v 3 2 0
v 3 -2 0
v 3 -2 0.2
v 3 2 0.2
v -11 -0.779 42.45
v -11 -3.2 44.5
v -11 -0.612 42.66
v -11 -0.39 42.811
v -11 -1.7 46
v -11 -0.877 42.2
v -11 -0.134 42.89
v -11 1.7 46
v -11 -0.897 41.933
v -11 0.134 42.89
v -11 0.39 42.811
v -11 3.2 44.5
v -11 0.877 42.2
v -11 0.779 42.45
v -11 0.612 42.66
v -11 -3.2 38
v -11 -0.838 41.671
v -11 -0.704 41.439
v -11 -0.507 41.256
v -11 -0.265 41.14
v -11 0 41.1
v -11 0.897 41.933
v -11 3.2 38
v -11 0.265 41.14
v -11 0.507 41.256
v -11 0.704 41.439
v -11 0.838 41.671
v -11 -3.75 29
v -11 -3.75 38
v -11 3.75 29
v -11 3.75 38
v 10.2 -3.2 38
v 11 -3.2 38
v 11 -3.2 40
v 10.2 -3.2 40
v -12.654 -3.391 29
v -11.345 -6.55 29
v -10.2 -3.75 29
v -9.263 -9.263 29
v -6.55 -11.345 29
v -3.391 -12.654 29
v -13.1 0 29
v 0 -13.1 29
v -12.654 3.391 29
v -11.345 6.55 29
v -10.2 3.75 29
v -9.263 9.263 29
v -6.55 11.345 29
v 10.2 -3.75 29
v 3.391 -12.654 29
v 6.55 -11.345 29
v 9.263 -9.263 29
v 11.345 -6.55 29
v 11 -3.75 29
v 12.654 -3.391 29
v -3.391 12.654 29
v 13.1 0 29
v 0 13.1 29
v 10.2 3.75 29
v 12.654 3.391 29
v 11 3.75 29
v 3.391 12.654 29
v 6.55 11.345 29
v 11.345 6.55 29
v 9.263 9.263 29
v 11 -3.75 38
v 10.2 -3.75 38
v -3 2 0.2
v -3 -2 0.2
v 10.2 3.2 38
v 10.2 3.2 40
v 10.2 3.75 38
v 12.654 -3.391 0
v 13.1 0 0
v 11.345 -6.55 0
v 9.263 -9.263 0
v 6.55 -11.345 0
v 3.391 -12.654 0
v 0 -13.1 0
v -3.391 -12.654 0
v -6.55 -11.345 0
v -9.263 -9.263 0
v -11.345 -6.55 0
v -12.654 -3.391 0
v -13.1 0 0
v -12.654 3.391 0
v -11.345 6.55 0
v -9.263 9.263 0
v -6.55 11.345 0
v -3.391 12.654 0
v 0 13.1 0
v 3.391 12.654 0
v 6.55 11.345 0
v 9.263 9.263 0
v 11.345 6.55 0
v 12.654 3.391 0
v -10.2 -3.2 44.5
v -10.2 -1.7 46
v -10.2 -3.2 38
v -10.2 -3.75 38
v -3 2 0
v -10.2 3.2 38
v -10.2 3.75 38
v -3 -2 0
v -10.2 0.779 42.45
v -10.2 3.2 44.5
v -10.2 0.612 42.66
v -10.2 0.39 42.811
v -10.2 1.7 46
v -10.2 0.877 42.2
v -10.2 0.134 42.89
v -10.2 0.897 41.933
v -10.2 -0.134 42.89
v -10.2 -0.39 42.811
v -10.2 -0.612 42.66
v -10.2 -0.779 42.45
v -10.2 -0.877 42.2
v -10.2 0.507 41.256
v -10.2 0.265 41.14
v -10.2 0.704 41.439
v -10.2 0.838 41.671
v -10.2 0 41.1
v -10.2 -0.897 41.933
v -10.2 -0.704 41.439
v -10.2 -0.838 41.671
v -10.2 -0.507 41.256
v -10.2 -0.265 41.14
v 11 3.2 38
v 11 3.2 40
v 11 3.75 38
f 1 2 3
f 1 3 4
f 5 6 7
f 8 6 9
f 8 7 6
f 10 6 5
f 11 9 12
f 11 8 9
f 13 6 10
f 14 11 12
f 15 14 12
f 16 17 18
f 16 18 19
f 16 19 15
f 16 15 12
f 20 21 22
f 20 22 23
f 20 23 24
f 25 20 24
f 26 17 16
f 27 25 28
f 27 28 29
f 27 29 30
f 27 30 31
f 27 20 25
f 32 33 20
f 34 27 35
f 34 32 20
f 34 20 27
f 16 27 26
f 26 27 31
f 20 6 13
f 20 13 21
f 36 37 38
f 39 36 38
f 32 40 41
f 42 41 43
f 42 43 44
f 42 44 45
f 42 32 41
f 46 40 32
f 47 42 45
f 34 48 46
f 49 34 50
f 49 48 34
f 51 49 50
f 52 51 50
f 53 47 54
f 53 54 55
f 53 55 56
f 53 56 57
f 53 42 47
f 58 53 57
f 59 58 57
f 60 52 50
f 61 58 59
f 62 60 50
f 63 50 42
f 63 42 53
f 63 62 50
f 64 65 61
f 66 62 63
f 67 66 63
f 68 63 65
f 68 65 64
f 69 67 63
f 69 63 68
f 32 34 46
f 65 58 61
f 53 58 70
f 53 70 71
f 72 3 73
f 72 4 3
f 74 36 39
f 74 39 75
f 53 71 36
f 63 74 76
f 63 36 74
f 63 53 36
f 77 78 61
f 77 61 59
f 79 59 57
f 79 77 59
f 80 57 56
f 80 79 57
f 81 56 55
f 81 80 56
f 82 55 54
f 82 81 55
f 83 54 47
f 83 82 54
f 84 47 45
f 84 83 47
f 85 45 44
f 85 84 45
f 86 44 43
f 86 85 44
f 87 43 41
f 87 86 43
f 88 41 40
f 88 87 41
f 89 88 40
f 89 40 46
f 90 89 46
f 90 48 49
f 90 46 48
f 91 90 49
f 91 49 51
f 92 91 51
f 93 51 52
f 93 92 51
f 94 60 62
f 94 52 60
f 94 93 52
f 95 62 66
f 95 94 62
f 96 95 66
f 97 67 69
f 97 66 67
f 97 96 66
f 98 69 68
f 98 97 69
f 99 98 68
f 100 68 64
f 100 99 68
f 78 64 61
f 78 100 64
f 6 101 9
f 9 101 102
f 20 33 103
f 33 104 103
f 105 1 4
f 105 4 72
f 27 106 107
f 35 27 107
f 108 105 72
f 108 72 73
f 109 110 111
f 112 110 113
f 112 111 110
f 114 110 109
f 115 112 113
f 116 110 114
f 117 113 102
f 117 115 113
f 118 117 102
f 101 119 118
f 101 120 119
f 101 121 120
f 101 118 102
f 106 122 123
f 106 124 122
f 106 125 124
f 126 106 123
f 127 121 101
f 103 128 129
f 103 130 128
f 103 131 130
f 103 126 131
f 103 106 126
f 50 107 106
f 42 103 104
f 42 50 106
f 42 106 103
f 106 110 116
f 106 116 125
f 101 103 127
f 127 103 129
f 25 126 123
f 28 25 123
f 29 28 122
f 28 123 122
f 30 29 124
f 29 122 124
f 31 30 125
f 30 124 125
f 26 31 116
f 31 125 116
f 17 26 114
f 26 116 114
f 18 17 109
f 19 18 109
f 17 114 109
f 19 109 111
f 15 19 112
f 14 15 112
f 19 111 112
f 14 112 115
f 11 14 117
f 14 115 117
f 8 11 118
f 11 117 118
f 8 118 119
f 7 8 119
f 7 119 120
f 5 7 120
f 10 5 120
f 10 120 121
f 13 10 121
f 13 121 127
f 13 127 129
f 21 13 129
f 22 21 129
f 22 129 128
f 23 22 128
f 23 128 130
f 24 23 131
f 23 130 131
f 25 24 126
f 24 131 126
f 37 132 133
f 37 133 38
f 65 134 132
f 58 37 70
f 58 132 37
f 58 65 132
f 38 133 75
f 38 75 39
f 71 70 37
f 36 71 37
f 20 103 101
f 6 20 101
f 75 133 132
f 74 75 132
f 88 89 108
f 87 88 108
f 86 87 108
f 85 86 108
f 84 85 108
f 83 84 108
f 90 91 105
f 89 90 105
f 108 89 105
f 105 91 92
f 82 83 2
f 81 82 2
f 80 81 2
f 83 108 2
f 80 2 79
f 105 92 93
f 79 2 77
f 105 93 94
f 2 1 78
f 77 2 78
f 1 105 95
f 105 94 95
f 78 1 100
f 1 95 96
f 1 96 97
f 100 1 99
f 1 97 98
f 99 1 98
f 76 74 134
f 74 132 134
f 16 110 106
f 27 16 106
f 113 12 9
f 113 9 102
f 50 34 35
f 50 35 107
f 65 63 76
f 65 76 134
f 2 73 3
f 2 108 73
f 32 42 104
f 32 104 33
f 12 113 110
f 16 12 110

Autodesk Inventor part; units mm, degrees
ref_plane "YZ Plane" through (0, 0, 0) normal (1, 0, 0) x (0, 1, 0)
ref_plane "XZ Plane" through (0, 0, 0) normal (0, 1, 0) x (-1, 0, 0)
ref_plane "XY Plane" through (0, 0, 0) normal (0, 0, 1) x (1, 0, 0)
sketch "Skizze1" plane through (0, 0, 0) normal (0, 0, 1) x (1, 0, 0)
  circle A0 centre (0, 0) radius 13.1
  dimension "d0" = 26.2
extrude "Extrusion1" add sketch "Skizze1" along normal blind 29
sketch "Skizze2" plane through (0, 0, 29) normal (0, 0, 1) x (1, 0, 0)
  line L0 (-11, 3.75) -> (-10.2, 3.75)
  line L1 (-10.2, 3.75) -> (-10.2, -3.75)
  line L2 (-10.2, -3.75) -> (-11, -3.75)
  line L3 (-11, -3.75) -> (-11, 3.75)
  line L4 (10.2, 3.75) -> (11, 3.75)
  line L5 (11, 3.75) -> (11, -3.75)
  line L6 (11, -3.75) -> (10.2, -3.75)
  line L7 (10.2, -3.75) -> (10.2, 3.75)
  line L8 (10.2, 0) -> (-10.2, 0) construction
  point P0 (0, 0)
  point P1 (0, 0)
  dimension "d3" = 7.5
  dimension "d4" = 0.8
  dimension "d6" = 22
sketch "Skizze3" plane through (0, 0, 0) normal (0, 1, 0) x (-1, 0, 0)
  line L0 (13.1, 29) -> (-13.1, 29) projected
  line L1 (-13.1, 0) -> (13.1, 0) projected
  line L2 (-13.1, 0) -> (-13.1, 29) projected
  line L3 (13.1, 0) -> (13.1, 29) projected
  point P0 (0, 0)
  dimension "d7" = 29
extrude "Extrusion2" add sketch "Skizze2" along normal blind 17
sketch "Skizze4" plane through (11, -3.75, 29) normal (1, 0, 0) x (0, 0, -1)
  line L0 (0, 7.5) -> (0, 0) projected
  line L1 (0, 7.5) -> (-17, 7.5) construction
  line L2 (-17, 0) -> (-17, 7.5) construction
  line L3 (0, 0) -> (-17, 0) construction
  line L4 (0, 0) -> (-17, 0) construction
  line L5 (-9, 0) -> (-9, 0.55)
  line L6 (-9, 0.55) -> (-15.5, 0.55)
  line L7 (-15.5, 0.55) -> (-17, 2.05)
  line L8 (-17, 5.45) -> (-15.5, 6.95)
  line L9 (-15.5, 6.95) -> (-9, 6.95)
  line L10 (-9, 6.95) -> (-9, 7.5)
  line L11 (0, 7.5) -> (-17, 7.5) construction
  circle A0 centre (-13, 3.75) radius 0.9
  line L12 (-13, 3.75) -> (-17, 3.75) construction
  line L13 (-17, 0) -> (-17, 7.5) construction
  line L14 (-17, 0) -> (-17, 7.5) construction
  line L15 (-9, 0) -> (-17, 0)
  line L16 (-17, 2.05) -> (-17, 0)
  line L17 (-17, 5.45) -> (-17, 7.5)
  line L18 (-9, 7.5) -> (-17, 7.5)
  point P0 (29, 3.75)
  dimension "d10" = 45
  dimension "d11" = 45
  dimension "d12" = 6.4
  dimension "d13" = 8
  dimension "d14" = 1.5
  dimension "d15" = 1.8
  dimension "d16" = 4
extrude "Extrusion3" cut sketch "Skizze4" against normal through all
sketch "Skizze5" plane through (0, 0, 0) normal (0, 0, -1) x (-1, 0, 0)
  line L0 (-3, 2) -> (3, 2)
  line L1 (3, 2) -> (3, -2)
  line L2 (3, -2) -> (-3, -2)
  line L3 (-3, -2) -> (-3, 2)
  line L4 (3, -2) -> (-3, 2) construction
  point P0 (0, 0)
  point P1 (0, 0)
  dimension "d19" = 6
  dimension "d20" = 4
extrude "Extrusion4" cut sketch "Skizze5" against normal blind 0.2
sketch "Skizze6" plane through (11, -3.75, 29) normal (1, 0, 0) x (0, 0, -1)
  line L0 (-17, 7.5187) -> (-11, 7.5187)
  line L1 (-11, 7.5187) -> (-11, -0.0187)
  line L2 (-11, -0.0187) -> (-17, -0.0187)
  line L3 (-17, -0.0187) -> (-17, 7.5187)
  line L4 (-17, 2.05) -> (-17, 5.45) projected
  point P0 (29, 3.75)
  point P1 (-17, 3.75)
  dimension "d23" = 6
extrude "Extrusion5" cut sketch "Skizze6" against normal blind 1
equation "\"d11\" = d10"
properties part number "Zündspule"
